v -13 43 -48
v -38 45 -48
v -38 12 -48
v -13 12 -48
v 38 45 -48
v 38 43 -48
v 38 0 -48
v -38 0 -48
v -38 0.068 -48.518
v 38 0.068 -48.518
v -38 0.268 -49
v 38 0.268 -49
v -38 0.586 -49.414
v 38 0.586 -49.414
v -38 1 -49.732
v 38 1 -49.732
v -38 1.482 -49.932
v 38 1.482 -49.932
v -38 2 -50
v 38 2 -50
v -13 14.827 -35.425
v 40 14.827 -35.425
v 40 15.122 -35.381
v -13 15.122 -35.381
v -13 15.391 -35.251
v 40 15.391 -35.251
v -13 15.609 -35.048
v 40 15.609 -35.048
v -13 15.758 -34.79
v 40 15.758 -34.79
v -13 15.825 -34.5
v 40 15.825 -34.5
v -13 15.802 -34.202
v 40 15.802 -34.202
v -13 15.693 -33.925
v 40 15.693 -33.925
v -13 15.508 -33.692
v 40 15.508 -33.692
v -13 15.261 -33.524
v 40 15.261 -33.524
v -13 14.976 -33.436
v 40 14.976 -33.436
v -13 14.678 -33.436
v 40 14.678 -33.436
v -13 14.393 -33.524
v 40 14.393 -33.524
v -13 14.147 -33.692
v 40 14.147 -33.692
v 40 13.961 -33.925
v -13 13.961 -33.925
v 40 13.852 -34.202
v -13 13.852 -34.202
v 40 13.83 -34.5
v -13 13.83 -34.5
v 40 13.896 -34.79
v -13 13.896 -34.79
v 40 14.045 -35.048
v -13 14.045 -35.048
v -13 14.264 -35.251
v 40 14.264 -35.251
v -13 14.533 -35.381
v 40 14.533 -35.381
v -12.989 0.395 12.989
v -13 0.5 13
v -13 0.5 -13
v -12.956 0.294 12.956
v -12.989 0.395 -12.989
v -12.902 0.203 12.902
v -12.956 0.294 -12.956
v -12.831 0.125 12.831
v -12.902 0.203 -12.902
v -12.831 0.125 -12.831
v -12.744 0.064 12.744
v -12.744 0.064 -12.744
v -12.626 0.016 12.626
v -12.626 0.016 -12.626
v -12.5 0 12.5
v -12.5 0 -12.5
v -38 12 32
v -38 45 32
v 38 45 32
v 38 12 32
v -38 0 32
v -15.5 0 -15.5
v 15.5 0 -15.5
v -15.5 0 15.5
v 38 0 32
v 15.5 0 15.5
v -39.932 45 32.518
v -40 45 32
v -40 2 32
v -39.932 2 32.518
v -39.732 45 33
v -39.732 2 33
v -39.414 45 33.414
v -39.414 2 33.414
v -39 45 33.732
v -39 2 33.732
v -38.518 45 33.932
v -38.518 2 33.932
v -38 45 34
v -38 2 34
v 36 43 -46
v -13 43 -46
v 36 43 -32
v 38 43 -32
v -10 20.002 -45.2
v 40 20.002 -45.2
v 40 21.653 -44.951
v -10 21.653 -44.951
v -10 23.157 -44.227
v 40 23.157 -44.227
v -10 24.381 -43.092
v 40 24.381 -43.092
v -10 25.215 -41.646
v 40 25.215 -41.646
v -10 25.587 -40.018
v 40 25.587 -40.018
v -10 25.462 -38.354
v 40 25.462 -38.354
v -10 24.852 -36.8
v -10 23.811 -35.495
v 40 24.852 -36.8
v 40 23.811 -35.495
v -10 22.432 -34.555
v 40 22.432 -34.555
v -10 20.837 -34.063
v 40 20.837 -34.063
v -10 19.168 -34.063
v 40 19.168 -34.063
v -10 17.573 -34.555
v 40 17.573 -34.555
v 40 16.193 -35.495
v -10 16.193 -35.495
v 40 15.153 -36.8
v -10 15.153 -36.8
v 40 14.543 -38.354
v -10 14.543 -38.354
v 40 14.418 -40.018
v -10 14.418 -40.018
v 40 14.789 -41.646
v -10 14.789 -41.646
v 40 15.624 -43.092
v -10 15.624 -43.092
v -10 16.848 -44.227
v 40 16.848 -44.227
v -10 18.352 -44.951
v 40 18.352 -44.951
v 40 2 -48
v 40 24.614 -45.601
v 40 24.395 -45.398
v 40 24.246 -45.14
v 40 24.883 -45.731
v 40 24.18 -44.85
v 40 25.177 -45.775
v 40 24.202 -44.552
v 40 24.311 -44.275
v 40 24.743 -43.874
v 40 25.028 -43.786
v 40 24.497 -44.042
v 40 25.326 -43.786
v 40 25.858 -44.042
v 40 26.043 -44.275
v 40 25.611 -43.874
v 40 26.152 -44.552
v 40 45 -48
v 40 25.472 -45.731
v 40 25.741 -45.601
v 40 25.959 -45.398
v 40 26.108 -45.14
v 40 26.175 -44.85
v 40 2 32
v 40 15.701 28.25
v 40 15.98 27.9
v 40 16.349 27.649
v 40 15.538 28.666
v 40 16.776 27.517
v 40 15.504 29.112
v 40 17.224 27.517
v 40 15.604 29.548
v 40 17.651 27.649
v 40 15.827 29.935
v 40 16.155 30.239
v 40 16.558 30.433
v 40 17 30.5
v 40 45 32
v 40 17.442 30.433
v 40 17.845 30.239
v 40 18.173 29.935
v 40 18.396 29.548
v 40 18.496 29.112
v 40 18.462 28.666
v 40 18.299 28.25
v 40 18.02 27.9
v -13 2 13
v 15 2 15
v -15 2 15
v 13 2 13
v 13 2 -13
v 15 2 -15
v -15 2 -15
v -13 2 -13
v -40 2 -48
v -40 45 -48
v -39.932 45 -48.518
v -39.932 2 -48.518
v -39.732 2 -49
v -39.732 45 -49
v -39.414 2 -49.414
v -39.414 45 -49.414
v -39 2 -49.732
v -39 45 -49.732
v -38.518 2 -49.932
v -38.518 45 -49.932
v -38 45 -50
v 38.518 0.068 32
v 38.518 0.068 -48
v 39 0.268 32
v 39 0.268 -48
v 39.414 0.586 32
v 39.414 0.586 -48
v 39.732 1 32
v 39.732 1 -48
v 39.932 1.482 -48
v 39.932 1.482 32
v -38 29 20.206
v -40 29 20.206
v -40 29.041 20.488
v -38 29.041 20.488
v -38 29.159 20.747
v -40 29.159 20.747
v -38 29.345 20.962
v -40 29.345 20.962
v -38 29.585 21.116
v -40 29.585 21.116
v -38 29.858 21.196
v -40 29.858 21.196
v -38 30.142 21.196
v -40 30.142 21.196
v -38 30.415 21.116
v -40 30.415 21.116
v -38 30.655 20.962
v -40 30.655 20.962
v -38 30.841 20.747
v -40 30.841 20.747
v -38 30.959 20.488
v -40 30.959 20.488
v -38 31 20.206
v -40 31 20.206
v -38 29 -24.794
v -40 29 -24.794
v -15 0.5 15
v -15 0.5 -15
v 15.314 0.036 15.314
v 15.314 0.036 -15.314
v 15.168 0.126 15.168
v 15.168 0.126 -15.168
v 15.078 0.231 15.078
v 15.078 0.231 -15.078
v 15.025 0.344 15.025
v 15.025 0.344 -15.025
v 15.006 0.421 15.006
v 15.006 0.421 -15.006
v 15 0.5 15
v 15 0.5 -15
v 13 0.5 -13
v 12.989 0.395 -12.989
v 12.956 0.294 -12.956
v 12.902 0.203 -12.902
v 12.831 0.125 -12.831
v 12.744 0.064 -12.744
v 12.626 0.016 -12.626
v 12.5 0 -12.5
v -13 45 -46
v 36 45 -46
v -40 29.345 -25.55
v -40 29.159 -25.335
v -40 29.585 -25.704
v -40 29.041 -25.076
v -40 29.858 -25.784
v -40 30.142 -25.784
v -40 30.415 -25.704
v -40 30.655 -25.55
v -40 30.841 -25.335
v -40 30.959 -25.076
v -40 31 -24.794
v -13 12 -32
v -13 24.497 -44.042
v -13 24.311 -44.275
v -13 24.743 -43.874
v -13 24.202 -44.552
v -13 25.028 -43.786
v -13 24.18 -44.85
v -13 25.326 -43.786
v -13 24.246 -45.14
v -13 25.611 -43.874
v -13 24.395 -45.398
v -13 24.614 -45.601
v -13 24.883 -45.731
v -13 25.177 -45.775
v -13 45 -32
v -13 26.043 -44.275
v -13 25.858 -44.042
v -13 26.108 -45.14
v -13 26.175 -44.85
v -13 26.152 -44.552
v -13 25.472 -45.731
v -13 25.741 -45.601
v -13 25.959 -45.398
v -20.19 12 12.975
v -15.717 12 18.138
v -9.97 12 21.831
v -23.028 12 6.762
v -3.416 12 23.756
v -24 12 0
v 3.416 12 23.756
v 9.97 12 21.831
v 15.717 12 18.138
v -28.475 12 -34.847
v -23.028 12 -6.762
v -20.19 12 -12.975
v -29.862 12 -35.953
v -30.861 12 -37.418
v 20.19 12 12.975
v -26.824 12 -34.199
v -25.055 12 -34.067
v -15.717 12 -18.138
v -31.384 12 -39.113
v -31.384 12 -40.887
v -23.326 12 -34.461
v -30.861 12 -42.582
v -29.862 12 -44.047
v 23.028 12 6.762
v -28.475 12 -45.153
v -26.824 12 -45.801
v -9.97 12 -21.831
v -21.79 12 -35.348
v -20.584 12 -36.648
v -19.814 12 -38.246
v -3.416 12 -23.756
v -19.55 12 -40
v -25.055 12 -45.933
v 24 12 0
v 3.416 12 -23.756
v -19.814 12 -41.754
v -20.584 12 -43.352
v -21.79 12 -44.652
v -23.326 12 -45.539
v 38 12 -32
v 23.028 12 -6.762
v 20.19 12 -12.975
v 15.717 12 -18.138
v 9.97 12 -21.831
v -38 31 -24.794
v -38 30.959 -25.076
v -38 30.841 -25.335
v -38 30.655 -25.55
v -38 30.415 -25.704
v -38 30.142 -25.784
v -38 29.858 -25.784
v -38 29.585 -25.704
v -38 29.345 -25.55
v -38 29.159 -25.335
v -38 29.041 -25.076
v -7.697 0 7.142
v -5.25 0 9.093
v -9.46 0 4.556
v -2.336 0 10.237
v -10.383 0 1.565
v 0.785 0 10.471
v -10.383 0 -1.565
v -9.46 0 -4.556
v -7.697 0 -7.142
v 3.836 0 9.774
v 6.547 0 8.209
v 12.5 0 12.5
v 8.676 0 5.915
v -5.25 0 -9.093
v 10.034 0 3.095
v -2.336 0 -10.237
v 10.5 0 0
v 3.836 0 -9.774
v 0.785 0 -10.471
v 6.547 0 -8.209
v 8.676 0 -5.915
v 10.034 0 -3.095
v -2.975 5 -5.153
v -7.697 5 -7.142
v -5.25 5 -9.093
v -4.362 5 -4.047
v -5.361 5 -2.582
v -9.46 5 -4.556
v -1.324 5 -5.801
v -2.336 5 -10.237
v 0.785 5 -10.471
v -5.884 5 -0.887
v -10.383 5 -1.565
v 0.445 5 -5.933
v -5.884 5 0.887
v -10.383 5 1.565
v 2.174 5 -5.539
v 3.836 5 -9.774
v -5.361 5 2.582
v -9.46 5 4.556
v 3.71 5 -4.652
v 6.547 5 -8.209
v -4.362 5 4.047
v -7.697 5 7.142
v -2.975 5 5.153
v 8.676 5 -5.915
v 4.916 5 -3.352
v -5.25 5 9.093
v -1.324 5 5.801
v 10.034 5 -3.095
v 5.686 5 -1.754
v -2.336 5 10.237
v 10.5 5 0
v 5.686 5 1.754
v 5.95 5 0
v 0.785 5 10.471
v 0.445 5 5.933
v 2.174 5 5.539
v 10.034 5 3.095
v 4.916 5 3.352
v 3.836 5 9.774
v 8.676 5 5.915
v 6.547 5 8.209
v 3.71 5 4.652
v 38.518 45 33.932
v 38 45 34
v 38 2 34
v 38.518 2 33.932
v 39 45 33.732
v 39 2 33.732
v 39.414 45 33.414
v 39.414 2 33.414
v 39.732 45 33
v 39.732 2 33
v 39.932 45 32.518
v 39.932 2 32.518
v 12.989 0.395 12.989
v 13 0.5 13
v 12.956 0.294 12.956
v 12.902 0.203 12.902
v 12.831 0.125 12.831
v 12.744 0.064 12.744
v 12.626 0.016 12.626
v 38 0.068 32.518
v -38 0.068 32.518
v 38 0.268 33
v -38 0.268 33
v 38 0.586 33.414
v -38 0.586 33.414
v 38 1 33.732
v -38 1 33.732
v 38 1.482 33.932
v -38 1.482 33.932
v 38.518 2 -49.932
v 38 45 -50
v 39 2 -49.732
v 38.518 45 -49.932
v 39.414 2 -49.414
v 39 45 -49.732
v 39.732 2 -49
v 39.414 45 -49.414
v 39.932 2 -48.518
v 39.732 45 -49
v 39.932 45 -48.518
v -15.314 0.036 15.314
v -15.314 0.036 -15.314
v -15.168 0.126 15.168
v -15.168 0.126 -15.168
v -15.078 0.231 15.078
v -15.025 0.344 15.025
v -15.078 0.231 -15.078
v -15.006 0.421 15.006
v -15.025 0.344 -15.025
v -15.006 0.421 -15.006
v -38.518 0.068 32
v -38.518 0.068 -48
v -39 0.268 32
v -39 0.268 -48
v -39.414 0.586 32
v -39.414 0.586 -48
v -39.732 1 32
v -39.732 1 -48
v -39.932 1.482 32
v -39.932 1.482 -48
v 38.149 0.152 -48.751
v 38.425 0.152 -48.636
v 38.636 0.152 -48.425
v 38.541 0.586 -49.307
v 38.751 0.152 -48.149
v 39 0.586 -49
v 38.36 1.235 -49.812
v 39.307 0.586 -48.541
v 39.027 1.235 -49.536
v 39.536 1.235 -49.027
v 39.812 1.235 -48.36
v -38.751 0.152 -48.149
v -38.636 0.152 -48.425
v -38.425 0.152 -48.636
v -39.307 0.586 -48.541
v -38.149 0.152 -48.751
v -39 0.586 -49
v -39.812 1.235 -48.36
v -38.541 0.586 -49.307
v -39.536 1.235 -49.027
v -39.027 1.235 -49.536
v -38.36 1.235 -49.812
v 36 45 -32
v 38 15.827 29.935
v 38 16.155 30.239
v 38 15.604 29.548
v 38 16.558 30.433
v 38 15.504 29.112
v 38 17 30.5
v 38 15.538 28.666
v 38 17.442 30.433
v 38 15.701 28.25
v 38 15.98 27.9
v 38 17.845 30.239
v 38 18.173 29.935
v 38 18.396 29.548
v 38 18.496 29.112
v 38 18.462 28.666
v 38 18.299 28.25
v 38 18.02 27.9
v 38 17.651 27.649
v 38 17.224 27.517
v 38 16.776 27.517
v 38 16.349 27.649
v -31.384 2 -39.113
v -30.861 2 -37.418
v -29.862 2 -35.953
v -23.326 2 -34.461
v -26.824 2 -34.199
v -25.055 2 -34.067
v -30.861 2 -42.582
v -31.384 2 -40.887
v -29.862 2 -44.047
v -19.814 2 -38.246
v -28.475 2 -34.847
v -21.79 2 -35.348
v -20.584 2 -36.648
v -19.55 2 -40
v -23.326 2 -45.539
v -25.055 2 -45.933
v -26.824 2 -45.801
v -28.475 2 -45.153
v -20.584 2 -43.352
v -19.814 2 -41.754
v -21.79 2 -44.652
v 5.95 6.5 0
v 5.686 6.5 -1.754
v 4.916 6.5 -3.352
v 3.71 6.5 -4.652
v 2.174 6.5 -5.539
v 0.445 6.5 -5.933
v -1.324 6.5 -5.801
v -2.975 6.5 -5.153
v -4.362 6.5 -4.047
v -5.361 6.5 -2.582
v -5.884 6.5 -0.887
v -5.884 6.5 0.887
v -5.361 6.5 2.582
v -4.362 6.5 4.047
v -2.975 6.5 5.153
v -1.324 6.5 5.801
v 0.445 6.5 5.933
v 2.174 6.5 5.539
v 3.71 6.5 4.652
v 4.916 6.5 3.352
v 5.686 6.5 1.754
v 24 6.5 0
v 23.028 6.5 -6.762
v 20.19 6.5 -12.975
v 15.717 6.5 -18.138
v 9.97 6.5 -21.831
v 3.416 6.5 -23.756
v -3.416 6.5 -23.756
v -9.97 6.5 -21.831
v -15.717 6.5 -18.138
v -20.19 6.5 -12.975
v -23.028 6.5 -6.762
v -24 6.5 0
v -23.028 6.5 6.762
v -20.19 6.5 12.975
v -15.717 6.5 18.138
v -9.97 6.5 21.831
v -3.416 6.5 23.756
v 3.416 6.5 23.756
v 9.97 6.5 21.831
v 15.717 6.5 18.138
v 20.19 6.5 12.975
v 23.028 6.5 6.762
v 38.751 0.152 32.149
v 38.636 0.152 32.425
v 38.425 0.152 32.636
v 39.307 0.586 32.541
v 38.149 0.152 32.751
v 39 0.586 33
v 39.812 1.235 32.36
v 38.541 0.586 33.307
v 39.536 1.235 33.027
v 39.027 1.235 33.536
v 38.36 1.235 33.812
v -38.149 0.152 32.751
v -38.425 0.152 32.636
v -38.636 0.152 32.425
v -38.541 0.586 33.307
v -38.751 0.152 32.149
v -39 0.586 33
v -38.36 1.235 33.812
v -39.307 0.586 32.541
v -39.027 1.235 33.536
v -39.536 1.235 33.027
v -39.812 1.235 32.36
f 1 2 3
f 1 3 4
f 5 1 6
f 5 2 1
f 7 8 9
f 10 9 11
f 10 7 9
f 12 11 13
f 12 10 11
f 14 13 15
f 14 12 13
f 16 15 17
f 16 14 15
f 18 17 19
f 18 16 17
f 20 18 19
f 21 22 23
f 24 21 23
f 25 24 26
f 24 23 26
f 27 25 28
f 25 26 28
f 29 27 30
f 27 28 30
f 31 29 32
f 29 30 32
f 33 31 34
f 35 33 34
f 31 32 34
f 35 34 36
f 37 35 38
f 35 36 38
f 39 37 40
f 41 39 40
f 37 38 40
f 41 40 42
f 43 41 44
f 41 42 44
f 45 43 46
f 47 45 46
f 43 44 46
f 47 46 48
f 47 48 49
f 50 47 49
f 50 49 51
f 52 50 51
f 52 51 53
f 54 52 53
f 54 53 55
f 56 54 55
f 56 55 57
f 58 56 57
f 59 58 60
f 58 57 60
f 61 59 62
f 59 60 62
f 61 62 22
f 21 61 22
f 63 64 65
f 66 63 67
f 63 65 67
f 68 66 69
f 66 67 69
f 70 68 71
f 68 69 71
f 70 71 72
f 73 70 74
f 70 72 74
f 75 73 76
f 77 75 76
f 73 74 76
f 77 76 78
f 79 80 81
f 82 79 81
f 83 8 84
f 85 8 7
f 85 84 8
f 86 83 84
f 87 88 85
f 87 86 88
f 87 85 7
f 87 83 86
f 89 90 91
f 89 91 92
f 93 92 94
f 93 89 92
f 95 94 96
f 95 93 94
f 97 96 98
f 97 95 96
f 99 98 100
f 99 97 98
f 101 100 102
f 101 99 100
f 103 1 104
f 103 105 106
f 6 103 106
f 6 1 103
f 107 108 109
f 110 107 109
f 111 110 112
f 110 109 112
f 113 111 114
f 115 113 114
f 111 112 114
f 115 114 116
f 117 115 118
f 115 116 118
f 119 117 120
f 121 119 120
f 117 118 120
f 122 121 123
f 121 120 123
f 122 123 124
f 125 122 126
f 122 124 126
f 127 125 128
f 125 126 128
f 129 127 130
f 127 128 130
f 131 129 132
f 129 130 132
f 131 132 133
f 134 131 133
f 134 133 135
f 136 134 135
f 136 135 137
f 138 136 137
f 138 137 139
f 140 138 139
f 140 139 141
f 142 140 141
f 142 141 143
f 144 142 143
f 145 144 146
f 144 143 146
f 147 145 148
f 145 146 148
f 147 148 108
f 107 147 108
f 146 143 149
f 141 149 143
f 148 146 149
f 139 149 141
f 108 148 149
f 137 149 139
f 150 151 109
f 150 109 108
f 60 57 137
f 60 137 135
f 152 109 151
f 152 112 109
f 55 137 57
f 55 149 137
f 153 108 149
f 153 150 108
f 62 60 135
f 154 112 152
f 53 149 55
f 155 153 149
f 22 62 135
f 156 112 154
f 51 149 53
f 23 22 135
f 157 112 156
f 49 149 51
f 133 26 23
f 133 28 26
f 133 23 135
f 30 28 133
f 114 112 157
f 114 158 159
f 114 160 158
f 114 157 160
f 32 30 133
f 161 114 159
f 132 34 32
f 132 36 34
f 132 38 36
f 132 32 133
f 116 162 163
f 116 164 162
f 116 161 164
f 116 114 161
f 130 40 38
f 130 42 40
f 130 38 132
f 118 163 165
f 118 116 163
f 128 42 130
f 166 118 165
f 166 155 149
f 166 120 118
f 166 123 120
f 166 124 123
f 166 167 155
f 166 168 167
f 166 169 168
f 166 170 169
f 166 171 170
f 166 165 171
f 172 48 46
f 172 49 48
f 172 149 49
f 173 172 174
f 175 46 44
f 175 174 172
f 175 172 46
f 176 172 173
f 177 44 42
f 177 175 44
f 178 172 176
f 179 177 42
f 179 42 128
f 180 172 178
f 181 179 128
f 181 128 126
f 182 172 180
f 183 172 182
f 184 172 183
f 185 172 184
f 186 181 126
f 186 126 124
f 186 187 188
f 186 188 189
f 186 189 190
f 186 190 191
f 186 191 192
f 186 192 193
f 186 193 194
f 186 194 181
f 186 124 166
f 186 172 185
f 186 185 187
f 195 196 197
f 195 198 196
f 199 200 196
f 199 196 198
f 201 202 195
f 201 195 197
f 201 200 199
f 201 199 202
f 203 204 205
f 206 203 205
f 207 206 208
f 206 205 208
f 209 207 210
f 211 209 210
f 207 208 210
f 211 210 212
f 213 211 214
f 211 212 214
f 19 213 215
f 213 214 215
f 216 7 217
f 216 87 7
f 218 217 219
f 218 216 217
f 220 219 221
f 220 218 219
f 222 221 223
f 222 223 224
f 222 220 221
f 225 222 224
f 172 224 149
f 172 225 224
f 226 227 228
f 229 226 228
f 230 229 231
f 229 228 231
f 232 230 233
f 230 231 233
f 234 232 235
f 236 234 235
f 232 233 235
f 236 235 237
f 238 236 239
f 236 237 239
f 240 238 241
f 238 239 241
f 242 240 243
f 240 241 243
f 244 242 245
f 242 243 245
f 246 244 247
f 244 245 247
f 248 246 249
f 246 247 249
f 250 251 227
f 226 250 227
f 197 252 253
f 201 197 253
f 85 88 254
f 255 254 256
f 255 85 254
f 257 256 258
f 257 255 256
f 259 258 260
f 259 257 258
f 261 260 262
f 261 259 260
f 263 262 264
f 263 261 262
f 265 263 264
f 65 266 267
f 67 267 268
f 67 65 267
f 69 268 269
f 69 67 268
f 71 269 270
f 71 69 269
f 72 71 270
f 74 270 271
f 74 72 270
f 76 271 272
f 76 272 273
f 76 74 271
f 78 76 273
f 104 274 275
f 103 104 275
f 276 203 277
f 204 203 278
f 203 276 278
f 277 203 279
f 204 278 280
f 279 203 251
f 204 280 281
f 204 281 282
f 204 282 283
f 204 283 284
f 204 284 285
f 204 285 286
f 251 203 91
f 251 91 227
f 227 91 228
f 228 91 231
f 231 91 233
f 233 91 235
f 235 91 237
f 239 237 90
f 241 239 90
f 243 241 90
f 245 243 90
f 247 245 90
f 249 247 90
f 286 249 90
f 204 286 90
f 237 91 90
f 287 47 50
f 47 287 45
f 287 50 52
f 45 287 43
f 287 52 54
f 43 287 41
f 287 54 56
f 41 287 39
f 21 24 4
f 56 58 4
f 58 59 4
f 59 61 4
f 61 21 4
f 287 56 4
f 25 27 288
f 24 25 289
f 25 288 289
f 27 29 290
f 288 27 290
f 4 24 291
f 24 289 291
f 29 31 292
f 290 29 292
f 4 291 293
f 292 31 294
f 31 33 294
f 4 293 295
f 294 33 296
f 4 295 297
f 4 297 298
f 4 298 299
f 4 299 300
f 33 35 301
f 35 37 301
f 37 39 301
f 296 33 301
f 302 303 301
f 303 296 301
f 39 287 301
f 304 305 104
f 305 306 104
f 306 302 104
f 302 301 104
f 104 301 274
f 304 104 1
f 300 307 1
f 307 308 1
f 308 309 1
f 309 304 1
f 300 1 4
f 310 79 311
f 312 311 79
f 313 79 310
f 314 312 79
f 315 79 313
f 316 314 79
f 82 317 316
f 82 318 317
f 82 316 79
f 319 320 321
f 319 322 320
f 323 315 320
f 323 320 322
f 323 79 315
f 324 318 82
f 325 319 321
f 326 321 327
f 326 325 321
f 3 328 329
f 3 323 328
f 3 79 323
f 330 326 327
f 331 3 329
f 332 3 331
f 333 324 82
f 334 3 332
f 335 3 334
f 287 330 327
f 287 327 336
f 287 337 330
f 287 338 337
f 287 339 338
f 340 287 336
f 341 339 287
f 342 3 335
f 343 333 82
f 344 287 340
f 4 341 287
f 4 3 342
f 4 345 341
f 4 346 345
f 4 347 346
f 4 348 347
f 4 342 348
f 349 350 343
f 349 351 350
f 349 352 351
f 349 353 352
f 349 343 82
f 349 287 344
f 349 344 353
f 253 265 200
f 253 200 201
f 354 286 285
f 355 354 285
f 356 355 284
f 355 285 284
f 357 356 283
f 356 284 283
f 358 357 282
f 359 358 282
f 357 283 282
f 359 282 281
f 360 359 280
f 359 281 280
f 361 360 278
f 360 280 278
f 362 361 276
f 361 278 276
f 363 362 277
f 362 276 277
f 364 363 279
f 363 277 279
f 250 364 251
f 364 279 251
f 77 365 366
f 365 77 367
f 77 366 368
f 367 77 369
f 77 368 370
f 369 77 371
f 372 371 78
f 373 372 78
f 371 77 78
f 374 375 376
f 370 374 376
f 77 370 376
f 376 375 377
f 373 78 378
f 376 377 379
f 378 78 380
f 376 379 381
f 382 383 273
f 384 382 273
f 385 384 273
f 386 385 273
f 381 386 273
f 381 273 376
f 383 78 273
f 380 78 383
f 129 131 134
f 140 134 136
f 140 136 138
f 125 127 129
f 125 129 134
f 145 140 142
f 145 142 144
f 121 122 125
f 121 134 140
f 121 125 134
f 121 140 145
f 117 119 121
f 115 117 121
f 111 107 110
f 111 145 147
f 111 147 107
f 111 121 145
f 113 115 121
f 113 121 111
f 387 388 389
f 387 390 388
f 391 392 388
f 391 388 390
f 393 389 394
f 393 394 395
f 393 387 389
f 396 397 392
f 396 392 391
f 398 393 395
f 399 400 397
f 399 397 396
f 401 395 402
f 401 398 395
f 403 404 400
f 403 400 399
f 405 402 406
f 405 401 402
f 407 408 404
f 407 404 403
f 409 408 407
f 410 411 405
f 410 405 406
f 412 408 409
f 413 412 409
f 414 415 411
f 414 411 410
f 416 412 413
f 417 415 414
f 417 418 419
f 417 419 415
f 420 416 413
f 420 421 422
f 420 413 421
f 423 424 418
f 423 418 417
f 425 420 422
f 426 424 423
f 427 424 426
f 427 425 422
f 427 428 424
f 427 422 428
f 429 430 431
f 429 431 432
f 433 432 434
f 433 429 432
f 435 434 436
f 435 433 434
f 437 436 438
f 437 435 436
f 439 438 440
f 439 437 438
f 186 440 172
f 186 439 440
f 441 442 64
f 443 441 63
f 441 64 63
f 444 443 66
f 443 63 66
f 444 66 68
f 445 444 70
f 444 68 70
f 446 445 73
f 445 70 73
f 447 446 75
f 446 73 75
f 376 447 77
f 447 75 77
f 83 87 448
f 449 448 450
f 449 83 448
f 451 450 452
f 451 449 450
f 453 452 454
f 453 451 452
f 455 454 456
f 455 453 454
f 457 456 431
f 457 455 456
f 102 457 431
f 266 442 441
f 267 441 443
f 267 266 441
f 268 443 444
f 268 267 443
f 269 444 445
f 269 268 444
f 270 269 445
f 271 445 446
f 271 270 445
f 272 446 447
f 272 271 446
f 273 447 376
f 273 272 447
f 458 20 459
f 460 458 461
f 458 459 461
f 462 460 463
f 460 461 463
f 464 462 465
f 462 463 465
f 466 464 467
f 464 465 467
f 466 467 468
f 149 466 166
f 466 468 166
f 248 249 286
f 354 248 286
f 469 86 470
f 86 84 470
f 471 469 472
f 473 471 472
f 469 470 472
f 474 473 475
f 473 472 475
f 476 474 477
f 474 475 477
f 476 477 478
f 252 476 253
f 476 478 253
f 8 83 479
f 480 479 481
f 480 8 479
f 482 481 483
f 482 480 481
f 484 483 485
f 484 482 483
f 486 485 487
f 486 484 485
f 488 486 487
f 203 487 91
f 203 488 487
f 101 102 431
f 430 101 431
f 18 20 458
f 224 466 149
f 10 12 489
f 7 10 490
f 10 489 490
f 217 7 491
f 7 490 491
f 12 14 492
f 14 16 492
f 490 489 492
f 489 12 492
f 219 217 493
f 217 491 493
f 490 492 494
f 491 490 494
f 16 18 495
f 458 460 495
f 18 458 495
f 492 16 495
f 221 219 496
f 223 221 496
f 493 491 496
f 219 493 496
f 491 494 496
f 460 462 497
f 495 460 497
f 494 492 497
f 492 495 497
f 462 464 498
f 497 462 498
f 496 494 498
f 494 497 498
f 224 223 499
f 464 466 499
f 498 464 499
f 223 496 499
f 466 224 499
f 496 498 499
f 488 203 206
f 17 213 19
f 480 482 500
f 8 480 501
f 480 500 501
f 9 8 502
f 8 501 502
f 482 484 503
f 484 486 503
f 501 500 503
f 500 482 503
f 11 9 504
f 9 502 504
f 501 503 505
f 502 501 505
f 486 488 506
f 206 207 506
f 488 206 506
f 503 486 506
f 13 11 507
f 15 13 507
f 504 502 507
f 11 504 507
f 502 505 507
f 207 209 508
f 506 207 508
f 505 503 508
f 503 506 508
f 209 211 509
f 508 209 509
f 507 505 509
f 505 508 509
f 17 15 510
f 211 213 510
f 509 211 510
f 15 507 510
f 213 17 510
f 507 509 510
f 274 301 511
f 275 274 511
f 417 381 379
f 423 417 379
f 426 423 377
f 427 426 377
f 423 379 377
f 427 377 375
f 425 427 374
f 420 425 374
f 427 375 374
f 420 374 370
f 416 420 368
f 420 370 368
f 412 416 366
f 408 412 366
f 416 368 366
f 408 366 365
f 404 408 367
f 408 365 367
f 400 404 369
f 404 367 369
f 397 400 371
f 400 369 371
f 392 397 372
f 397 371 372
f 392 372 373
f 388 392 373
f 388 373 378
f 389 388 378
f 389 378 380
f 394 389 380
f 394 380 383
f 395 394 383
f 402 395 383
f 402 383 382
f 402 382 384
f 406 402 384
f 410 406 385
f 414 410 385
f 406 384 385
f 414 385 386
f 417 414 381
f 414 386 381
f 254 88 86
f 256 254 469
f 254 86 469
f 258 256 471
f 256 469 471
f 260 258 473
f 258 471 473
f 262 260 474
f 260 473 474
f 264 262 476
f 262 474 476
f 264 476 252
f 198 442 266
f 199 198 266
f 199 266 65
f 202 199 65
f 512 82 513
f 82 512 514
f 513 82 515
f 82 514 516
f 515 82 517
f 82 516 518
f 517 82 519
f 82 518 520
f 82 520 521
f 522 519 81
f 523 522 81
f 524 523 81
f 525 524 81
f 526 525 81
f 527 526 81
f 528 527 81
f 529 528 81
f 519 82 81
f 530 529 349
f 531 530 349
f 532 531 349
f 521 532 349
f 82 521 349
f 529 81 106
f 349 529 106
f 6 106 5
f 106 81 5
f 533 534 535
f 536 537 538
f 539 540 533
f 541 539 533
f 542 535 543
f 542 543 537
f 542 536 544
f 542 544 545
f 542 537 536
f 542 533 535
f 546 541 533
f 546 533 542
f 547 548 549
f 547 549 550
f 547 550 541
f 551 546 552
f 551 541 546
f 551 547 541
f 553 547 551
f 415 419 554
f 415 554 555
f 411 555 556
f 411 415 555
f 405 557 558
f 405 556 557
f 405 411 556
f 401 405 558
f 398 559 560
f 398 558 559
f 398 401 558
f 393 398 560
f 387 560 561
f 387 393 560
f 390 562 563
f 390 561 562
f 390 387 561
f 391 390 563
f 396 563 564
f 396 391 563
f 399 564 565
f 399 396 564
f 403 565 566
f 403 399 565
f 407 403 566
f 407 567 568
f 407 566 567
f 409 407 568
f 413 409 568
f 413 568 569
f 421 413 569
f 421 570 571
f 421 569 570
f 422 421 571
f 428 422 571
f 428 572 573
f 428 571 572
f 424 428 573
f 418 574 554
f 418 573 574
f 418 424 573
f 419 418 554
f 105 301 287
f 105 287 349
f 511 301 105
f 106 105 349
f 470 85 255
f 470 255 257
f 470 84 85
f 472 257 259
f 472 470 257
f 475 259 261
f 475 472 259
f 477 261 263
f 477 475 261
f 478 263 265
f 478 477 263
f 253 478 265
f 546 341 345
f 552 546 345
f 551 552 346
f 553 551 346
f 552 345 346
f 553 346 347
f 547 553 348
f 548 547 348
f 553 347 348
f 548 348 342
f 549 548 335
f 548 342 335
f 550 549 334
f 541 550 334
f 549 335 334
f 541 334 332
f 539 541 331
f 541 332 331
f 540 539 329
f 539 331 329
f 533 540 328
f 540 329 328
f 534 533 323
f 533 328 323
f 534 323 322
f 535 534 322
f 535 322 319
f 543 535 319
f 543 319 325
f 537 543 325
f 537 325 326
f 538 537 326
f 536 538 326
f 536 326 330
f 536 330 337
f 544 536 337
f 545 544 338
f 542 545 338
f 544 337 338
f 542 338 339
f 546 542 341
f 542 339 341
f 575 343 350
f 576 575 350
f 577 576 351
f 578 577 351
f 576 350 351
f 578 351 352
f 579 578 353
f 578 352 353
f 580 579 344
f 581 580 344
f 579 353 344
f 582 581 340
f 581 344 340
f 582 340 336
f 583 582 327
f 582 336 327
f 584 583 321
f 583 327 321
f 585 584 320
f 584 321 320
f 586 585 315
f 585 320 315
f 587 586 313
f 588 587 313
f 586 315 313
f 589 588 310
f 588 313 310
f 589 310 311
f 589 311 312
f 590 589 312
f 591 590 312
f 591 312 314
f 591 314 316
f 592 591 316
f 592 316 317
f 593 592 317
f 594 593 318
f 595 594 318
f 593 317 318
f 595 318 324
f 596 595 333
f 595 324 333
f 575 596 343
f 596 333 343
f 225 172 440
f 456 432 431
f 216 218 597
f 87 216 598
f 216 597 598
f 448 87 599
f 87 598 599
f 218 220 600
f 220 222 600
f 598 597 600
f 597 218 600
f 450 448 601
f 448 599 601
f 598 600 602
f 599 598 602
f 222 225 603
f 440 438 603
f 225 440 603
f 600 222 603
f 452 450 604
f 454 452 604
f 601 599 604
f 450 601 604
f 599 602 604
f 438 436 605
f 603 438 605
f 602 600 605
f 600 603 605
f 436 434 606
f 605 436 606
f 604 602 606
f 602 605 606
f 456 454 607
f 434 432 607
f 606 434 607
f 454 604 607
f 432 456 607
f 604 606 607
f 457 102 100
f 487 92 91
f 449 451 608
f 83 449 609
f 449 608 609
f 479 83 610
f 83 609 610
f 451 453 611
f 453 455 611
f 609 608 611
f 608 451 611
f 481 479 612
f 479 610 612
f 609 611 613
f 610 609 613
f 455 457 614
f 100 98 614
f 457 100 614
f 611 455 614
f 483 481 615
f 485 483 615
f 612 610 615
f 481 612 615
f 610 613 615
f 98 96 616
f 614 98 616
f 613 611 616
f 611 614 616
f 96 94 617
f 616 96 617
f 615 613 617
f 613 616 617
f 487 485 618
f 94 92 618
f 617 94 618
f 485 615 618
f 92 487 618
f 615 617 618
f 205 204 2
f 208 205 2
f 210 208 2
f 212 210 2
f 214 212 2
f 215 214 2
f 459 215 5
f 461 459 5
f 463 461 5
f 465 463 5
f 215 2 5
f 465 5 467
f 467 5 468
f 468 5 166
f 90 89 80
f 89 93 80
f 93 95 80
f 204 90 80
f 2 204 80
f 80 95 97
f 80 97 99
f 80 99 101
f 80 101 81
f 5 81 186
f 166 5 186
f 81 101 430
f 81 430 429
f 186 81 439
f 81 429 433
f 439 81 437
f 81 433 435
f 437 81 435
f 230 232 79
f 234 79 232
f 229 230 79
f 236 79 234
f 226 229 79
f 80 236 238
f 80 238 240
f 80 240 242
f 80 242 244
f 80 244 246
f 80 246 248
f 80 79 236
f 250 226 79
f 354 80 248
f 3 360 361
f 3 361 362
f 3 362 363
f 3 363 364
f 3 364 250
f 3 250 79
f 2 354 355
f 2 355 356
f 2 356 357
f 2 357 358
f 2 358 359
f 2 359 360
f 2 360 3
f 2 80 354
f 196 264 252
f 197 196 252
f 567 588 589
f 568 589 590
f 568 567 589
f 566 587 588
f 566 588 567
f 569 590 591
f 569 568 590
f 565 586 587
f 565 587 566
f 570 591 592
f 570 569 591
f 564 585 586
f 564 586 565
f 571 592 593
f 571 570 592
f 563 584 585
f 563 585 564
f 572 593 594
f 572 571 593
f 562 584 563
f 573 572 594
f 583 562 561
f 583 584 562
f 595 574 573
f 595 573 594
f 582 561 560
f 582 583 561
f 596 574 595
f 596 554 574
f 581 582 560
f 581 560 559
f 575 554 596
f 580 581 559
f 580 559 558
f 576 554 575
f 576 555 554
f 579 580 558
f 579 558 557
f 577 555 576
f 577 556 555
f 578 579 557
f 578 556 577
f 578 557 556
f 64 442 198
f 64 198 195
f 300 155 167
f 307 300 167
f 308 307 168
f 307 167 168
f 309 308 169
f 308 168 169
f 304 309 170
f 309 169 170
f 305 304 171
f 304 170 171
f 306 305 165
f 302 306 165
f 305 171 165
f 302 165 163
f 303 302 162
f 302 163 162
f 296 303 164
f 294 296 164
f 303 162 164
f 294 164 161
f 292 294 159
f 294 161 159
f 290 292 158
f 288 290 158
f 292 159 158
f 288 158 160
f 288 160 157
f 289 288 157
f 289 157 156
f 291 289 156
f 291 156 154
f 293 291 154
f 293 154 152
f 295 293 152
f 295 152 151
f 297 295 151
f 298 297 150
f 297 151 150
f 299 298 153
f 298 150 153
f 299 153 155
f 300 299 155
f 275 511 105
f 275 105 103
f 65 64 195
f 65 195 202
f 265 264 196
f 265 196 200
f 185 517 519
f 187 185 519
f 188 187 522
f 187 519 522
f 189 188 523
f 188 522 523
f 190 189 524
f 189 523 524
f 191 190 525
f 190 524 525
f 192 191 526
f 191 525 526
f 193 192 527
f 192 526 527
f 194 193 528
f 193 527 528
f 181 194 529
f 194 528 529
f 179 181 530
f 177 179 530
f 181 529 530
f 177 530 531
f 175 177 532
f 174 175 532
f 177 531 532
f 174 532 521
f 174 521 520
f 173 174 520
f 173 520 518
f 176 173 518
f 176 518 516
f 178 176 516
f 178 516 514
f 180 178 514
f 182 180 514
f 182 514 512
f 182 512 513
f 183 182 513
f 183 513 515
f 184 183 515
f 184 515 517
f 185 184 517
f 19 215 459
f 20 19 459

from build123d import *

# Parameters (mm, degrees)
SKETCH1_W           = 80
SKETCH1_H           = 68
BOSS_EXTRUDE1_DEPTH = 45
CUT_EXTRUDE1_START  = 45
SKETCH2_W           = 76
SKETCH2_H           = 64
CUT_EXTRUDE1_DEPTH  = 33
SKETCH6_R           = 10.5
CUT_EXTRUDE10_DEPTH = 5
SKETCH7_W           = 30
SKETCH7_H           = 30
SKETCH7_W_2         = 26
SKETCH7_H_2         = 26
CUT_EXTRUDE11_DEPTH = 2
SKETCH8_R           = 1.5
CUT_EXTRUDE12_DEPTH = 3
SKETCH5_R           = 5.95
CUT_EXTRUDE14_DEPTH = 46
FILLET1_R           = 0.5
CUT_EXTRUDE15_START = 12
SKETCH12_R          = 24
CUT_EXTRUDE15_DEPTH = 5.5
BOSS_EXTRUDE5_START = -34
SKETCH13_W          = 80
SKETCH13_H          = 45
BOSS_EXTRUDE5_DEPTH = 16
CUT_EXTRUDE16_START = 45
SKETCH15_W          = 25
SKETCH15_H          = 16
CUT_EXTRUDE16_DEPTH = 33
SKETCH16_R          = 5.95
CUT_EXTRUDE17_DEPTH = 10
CUT_EXTRUDE18_START = 40
SKETCH17_R          = 5.6
CUT_EXTRUDE18_DEPTH = 50
CUT_EXTRUDE19_START = 40
SKETCH20_R          = 1
CUT_EXTRUDE19_DEPTH = 53
FILLET3_R           = 2
FILLET4_R           = 2
CUT_EXTRUDE20_START = 45
SKETCH21_W          = 51
SKETCH21_H          = 2
CUT_EXTRUDE20_DEPTH = 2
CUT_EXTRUDE22_START = 45
SKETCH22_W          = 2
SKETCH22_H          = 14
CUT_EXTRUDE22_DEPTH = 2
CUT_EXTRUDE23_START = -40
CUT_EXTRUDE23_DEPTH = 2


with BuildPart() as part:
    # Sketch1 → Boss-Extrude1 (new body)
    with BuildSketch(Plane(origin=(0, 0, 0), x_dir=(1, 0, 0), z_dir=(0, 1, 0))):
        Rectangle(SKETCH1_W, SKETCH1_H)
    extrude(amount=BOSS_EXTRUDE1_DEPTH)

    # Sketch2 → Cut-Extrude1 (cut)
    with BuildSketch(Plane(origin=(0, 0, 0), x_dir=(1, 0, 0), z_dir=(0, 1, 0)).offset(CUT_EXTRUDE1_START)):
        Rectangle(SKETCH2_W, SKETCH2_H)
    extrude(amount=-CUT_EXTRUDE1_DEPTH, mode=Mode.SUBTRACT)

    # Sketch6 → Cut-Extrude10 (cut)
    with BuildSketch(Plane.XZ):
        Circle(SKETCH6_R)
    extrude(amount=-CUT_EXTRUDE10_DEPTH, mode=Mode.SUBTRACT)

    # Sketch7 → Cut-Extrude11 (cut)
    with BuildSketch(Plane(origin=(0, 0, 0), x_dir=(-1, 0, 0), z_dir=(0, -1, 0))):
        Rectangle(SKETCH7_W, SKETCH7_H)
        Rectangle(SKETCH7_W_2, SKETCH7_H_2, mode=Mode.SUBTRACT)
    extrude(amount=-CUT_EXTRUDE11_DEPTH, mode=Mode.SUBTRACT)

    # Sketch8 → Cut-Extrude12 (cut, through all)
    with BuildSketch(Plane.ZY.offset(-38)):
        with Locations((29, 17)):
            Circle(SKETCH8_R)
    extrude(amount=-CUT_EXTRUDE12_DEPTH, mode=Mode.SUBTRACT)

    # Sketch5 → Cut-Extrude14 (cut, through all)
    with BuildSketch(Plane(origin=(0, 0, 0), x_dir=(1, 0, 0), z_dir=(0, 1, 0))):
        Circle(SKETCH5_R)
    extrude(amount=CUT_EXTRUDE14_DEPTH, mode=Mode.SUBTRACT)

    # Fillet1
    fillet1_edges = [part.edges().sort_by_distance(p)[0] for p in [
        (15, 0, 0),
        (0, 0, 15),
        (-15, 0, 0),
        (0, 0, -15),
        (13, 0, 0),
        (0, 0, -13),
        (-13, 0, 0),
        (0, 0, 13),
    ]]
    fillet(fillet1_edges, radius=FILLET1_R)

    # Sketch12 → Cut-Extrude15 (cut)
    with BuildSketch(Plane(origin=(0, 0, 0), x_dir=(1, 0, 0), z_dir=(0, 1, 0)).offset(CUT_EXTRUDE15_START)):
        Circle(SKETCH12_R)
    extrude(amount=-CUT_EXTRUDE15_DEPTH, mode=Mode.SUBTRACT)

    # Sketch13 → Boss-Extrude5 (add)
    with BuildSketch(Plane.XY.offset(BOSS_EXTRUDE5_START)):
        with Locations((0, 22.5)):
            Rectangle(SKETCH13_W, SKETCH13_H)
    extrude(amount=-BOSS_EXTRUDE5_DEPTH)

    # Sketch15 → Cut-Extrude16 (cut)
    with BuildSketch(Plane(origin=(0, 0, 0), x_dir=(1, 0, 0), z_dir=(0, 1, 0)).offset(CUT_EXTRUDE16_START)):
        with Locations((-25.5, 40)):
            Rectangle(SKETCH15_W, SKETCH15_H)
    extrude(amount=-CUT_EXTRUDE16_DEPTH, mode=Mode.SUBTRACT)

    # Sketch16 → Cut-Extrude17 (cut)
    with BuildSketch(Plane(origin=(0, 12, 0), x_dir=(1, 0, 0), z_dir=(0, 1, 0))):
        with Locations((-25.5, 40)):
            Circle(SKETCH16_R)
    extrude(amount=-CUT_EXTRUDE17_DEPTH, mode=Mode.SUBTRACT)

    # Sketch17 → Cut-Extrude18 (cut)
    with BuildSketch(Plane(origin=(0, 0, 0), x_dir=(0, 0, -1), z_dir=(1, 0, 0)).offset(CUT_EXTRUDE18_START)):
        with Locations((39.6, 20.00233054)):
            Circle(SKETCH17_R)
    extrude(amount=-CUT_EXTRUDE18_DEPTH, mode=Mode.SUBTRACT)

    # Sketch20 → Cut-Extrude19 (cut)
    with BuildSketch(Plane(origin=(0, 0, 0), x_dir=(0, 0, -1), z_dir=(1, 0, 0)).offset(CUT_EXTRUDE19_START)):
        with Locations((44.775, 25.17733054)):
            Circle(SKETCH20_R)
        with Locations((34.425, 14.82733054)):
            Circle(SKETCH20_R)
    extrude(amount=-CUT_EXTRUDE19_DEPTH, mode=Mode.SUBTRACT)

    # Fillet3
    fillet3_edges = [part.edges().sort_by_distance(p)[0] for p in [
        (-40, 22.5, -50),
        (40, 22.5, 34),
        (-40, 22.5, 34),
        (40, 22.5, -50),
    ]]
    fillet(fillet3_edges, radius=FILLET3_R)

    # Fillet4
    fillet4_edges = [part.edges().sort_by_distance(p)[0] for p in [
        (40, 0, -8),
        (0, 0, 34),
        (-40, 0, -8),
        (0, 0, -50),
        (-39.414213562, 0, 33.414213562),
        (-39.414213562, 0, -49.414213562),
        (39.414213562, 0, -49.414213562),
        (39.414213562, 0, 33.414213562),
    ]]
    fillet(fillet4_edges, radius=FILLET4_R)

    # Sketch21 → Cut-Extrude20 (cut)
    with BuildSketch(Plane(origin=(0, 0, 0), x_dir=(1, 0, 0), z_dir=(0, 1, 0)).offset(CUT_EXTRUDE20_START)):
        with Locations((12.5, 47)):
            Rectangle(SKETCH21_W, SKETCH21_H)
    extrude(amount=-CUT_EXTRUDE20_DEPTH, mode=Mode.SUBTRACT)

    # Sketch22 → Cut-Extrude22 (cut)
    with BuildSketch(Plane(origin=(0, 0, 0), x_dir=(1, 0, 0), z_dir=(0, 1, 0)).offset(CUT_EXTRUDE22_START)):
        with Locations((37, 39)):
            Rectangle(SKETCH22_W, SKETCH22_H)
    extrude(amount=-CUT_EXTRUDE22_DEPTH, mode=Mode.SUBTRACT)

    # Sketch23 → Cut-Extrude23 (cut)
    with BuildSketch(Plane(origin=(0, 0, 0), x_dir=(0, 0, -1), z_dir=(1, 0, 0)).offset(CUT_EXTRUDE23_START)):
        with BuildLine():
            Line((-20.205872853, 31), (24.794127147, 31))
            ThreePointArc((24.794127147, 31), (25.794127147, 30), (24.794127147, 29))
            Line((24.794127147, 29), (-20.205872853, 29))
            ThreePointArc((-20.205872853, 29), (-21.205872853, 30), (-20.205872853, 31))
        make_face()
    extrude(amount=CUT_EXTRUDE23_DEPTH, mode=Mode.SUBTRACT)


solid = part.part
